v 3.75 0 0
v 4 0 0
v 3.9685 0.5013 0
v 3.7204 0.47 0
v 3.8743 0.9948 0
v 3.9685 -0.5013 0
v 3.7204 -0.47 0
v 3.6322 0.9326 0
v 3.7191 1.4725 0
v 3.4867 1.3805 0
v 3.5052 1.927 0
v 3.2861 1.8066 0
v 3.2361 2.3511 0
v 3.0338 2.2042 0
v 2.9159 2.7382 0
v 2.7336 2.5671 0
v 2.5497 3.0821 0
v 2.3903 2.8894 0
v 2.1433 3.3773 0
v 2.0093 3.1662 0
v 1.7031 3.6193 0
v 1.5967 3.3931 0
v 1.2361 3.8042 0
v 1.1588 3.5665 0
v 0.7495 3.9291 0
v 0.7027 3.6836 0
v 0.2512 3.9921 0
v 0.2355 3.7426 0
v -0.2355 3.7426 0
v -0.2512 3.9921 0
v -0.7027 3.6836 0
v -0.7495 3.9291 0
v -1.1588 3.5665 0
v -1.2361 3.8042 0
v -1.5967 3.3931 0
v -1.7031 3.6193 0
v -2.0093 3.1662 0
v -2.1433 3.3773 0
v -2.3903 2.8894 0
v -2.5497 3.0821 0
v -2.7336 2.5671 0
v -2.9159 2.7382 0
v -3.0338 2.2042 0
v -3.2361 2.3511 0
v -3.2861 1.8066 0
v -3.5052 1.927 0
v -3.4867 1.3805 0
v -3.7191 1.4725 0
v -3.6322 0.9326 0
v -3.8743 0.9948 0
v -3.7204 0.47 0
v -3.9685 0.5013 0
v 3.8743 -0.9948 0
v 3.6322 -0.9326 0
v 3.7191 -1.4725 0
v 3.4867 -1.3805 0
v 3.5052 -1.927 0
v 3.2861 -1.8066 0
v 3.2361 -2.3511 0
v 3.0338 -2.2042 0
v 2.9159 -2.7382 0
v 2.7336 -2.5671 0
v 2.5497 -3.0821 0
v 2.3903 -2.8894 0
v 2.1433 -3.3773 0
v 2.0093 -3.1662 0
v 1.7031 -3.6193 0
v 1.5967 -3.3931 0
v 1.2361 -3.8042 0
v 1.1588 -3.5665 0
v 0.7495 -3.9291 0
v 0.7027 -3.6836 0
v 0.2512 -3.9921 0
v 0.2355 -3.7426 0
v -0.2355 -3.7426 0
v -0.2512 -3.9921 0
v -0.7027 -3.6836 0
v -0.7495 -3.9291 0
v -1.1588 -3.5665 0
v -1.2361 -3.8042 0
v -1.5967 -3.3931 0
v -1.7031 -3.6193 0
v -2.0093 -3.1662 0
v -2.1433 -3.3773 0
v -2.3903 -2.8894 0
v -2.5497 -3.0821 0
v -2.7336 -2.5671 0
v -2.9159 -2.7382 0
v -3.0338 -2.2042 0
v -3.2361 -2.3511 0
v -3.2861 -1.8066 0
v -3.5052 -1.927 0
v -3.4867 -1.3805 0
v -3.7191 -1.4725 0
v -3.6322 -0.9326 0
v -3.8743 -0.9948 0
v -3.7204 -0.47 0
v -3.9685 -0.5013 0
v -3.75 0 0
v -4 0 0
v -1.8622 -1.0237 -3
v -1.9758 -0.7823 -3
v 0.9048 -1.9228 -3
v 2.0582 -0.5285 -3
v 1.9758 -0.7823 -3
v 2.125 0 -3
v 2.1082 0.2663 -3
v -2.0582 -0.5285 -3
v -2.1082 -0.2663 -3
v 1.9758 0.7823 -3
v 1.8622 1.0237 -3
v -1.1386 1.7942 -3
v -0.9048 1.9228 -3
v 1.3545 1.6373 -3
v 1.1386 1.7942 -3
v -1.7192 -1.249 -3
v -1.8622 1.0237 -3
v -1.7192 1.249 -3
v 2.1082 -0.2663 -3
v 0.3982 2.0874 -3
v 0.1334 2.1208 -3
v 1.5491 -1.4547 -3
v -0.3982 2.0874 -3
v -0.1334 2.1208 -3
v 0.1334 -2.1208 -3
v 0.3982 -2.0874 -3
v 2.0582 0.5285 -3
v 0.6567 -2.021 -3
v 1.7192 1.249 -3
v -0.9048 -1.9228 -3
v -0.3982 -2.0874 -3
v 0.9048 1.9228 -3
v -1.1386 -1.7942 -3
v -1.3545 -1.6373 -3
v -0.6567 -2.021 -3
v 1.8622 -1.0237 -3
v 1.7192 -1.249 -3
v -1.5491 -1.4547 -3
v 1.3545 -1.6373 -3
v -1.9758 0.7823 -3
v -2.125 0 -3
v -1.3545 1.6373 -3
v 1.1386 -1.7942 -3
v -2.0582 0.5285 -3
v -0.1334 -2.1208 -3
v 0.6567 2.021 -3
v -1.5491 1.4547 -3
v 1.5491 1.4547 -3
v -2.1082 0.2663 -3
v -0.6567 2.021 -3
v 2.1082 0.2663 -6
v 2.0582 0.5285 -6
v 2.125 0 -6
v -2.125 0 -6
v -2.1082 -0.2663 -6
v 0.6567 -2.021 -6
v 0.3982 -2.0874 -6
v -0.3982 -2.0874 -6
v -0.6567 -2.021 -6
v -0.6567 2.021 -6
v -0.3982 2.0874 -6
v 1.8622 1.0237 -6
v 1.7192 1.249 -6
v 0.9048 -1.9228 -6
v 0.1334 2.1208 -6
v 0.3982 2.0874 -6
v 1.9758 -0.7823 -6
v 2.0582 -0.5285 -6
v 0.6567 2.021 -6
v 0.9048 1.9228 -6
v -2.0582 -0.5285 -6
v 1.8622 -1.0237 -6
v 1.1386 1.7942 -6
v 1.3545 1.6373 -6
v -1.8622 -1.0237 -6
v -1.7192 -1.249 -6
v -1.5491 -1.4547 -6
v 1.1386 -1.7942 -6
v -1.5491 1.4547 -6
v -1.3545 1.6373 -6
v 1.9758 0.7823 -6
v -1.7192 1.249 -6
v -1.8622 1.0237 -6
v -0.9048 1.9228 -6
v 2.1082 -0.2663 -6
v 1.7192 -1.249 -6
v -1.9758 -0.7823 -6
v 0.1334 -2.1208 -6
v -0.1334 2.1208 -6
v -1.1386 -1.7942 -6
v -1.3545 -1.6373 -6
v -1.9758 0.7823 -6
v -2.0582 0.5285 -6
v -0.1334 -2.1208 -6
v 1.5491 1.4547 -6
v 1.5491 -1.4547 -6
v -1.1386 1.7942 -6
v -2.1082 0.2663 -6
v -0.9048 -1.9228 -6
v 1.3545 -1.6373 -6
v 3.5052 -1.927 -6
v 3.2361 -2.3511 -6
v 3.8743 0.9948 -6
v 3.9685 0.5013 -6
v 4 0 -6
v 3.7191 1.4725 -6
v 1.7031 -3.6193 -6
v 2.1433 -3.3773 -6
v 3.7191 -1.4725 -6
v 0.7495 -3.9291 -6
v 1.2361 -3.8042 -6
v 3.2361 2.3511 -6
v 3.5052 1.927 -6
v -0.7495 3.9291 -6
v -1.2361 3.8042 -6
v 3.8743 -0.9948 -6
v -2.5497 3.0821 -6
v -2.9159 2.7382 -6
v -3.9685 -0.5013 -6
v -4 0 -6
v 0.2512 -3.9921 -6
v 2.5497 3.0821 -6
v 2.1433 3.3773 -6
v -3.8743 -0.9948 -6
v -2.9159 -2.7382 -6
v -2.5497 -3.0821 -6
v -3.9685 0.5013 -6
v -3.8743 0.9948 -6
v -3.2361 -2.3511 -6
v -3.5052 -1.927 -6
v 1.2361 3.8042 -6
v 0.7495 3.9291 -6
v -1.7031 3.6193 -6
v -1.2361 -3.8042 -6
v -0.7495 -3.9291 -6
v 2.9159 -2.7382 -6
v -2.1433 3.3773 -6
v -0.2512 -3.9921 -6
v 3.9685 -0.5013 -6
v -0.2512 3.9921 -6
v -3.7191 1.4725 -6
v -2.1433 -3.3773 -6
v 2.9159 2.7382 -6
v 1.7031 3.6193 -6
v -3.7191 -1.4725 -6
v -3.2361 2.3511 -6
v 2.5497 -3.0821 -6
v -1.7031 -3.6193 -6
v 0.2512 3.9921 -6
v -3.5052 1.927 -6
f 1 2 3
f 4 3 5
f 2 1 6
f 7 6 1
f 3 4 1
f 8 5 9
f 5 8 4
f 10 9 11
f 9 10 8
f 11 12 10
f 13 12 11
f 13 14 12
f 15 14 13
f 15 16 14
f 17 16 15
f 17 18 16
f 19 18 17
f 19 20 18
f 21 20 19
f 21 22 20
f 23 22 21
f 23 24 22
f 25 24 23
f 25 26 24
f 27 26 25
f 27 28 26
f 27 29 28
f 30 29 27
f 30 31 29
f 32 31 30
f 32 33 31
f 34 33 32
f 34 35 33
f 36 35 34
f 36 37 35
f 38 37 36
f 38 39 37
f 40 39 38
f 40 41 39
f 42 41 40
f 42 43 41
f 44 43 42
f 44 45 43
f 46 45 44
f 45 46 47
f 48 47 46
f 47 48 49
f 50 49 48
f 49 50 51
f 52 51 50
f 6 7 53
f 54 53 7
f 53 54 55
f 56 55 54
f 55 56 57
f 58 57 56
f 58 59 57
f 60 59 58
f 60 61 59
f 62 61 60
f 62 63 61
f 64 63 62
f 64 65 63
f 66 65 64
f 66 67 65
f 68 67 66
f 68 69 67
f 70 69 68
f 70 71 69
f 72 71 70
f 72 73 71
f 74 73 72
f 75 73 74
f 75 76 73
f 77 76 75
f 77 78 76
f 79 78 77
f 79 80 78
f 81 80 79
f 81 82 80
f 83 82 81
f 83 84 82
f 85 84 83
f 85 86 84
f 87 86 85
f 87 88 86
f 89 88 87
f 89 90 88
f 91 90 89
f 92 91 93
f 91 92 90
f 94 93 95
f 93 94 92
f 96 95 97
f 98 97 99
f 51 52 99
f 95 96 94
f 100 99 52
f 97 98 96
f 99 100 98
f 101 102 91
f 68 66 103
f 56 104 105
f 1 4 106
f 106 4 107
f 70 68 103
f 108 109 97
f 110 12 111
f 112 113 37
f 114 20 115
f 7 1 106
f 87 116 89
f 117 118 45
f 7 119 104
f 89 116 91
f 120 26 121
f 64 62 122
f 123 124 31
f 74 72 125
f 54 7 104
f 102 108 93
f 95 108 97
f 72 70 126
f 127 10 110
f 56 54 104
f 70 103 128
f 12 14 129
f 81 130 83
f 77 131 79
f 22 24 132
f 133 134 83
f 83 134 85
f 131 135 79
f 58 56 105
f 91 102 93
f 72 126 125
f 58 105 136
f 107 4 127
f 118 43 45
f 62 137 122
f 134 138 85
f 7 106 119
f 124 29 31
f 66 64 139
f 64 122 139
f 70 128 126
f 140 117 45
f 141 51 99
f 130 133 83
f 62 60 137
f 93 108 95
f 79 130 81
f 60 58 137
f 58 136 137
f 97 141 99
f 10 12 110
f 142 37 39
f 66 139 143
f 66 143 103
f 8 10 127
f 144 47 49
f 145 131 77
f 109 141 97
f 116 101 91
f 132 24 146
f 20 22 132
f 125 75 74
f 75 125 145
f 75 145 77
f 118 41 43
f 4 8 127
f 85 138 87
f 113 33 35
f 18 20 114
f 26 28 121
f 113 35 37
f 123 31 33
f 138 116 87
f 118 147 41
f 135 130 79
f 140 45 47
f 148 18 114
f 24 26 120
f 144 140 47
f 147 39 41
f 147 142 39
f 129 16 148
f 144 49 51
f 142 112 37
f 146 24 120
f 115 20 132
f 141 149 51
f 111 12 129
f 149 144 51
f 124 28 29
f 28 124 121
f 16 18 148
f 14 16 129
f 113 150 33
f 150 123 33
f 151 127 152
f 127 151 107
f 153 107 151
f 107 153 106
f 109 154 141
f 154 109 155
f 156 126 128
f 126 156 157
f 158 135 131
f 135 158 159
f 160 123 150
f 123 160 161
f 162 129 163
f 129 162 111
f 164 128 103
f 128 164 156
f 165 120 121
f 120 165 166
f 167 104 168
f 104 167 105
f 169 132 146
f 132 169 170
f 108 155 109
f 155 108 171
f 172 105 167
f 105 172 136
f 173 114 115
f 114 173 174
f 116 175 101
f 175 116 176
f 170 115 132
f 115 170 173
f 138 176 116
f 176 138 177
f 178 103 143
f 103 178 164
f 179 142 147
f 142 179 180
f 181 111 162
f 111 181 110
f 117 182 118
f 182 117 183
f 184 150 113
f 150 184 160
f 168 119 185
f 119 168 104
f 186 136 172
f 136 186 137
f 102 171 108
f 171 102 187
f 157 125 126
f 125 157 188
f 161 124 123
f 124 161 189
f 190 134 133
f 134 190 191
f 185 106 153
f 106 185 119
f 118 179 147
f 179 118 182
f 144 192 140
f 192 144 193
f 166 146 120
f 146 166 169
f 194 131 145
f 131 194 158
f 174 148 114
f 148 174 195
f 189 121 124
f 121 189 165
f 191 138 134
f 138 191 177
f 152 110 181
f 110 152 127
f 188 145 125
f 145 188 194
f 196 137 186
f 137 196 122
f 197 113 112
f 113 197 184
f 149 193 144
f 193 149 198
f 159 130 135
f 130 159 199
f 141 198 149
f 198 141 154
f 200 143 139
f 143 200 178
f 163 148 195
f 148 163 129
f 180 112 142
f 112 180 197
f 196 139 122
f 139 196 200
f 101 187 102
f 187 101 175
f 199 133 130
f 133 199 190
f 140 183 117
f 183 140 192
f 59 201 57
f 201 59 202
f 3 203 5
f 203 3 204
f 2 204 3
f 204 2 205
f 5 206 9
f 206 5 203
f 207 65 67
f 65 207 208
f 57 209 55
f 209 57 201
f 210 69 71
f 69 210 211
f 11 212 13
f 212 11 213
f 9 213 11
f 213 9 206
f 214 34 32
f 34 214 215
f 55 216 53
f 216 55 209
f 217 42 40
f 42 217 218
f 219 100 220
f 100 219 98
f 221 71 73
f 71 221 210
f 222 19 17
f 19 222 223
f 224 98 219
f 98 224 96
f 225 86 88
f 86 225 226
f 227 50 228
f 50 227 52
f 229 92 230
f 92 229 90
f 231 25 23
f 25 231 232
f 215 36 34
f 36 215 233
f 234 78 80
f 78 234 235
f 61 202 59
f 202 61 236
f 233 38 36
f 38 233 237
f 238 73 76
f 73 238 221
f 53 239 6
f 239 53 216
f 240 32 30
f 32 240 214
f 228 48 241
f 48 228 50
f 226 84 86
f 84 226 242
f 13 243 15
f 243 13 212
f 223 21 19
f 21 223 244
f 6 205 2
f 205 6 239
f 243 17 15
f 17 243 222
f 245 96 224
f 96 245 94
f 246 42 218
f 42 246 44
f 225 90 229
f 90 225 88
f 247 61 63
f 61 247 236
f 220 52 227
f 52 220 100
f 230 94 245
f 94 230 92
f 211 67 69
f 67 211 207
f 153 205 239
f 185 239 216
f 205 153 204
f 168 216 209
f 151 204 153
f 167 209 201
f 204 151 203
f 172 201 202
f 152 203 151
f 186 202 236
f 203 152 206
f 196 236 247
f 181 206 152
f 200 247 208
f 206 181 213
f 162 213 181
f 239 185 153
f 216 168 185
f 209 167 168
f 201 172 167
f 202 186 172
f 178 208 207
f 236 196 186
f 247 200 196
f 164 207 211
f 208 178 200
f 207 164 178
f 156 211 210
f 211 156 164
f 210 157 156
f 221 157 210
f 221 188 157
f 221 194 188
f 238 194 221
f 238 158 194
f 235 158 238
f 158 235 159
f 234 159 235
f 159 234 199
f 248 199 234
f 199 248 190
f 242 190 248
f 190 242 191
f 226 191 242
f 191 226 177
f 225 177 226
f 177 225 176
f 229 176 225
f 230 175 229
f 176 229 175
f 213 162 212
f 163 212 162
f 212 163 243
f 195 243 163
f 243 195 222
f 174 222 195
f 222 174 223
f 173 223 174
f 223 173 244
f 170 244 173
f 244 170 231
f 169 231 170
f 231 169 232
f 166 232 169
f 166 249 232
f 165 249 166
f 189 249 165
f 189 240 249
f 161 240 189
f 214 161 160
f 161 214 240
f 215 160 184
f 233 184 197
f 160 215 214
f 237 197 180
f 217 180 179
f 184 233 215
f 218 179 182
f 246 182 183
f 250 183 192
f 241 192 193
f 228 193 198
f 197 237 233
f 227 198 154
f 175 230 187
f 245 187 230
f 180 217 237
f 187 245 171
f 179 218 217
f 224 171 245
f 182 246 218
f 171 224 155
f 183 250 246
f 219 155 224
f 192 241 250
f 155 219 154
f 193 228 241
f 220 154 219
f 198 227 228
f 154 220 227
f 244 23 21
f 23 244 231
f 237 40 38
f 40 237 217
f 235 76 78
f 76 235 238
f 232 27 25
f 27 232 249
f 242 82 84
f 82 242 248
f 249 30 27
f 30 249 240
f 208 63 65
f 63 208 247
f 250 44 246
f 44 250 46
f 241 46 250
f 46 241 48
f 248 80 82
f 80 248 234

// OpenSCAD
$fn = 50;

difference() {
	union() {
		translate(v = [0, 0, -6.0]) {
			cylinder(h = 6, r = 4.0);
		}
	}
	union() {
		translate(v = [0, 0, 0]) {
			rotate(a = [0, 0, 0]) {
				difference() {
					union() {
						translate(v = [0, 0, -9.0]) {
							cylinder(h = 9, r = 2.0);
						}
						translate(v = [0, 0, -3]) {
							cylinder(h = 3, r1 = 2.125, r2 = 3.75);
						}
						translate(v = [0, 0, -9.0]) {
							cylinder(h = 9, r = 2.125);
						}
						translate(v = [0, 0, -9.0]) {
							cylinder(h = 9, r = 2.0);
						}
					}
					union();
				}
			}
		}
	}
}
